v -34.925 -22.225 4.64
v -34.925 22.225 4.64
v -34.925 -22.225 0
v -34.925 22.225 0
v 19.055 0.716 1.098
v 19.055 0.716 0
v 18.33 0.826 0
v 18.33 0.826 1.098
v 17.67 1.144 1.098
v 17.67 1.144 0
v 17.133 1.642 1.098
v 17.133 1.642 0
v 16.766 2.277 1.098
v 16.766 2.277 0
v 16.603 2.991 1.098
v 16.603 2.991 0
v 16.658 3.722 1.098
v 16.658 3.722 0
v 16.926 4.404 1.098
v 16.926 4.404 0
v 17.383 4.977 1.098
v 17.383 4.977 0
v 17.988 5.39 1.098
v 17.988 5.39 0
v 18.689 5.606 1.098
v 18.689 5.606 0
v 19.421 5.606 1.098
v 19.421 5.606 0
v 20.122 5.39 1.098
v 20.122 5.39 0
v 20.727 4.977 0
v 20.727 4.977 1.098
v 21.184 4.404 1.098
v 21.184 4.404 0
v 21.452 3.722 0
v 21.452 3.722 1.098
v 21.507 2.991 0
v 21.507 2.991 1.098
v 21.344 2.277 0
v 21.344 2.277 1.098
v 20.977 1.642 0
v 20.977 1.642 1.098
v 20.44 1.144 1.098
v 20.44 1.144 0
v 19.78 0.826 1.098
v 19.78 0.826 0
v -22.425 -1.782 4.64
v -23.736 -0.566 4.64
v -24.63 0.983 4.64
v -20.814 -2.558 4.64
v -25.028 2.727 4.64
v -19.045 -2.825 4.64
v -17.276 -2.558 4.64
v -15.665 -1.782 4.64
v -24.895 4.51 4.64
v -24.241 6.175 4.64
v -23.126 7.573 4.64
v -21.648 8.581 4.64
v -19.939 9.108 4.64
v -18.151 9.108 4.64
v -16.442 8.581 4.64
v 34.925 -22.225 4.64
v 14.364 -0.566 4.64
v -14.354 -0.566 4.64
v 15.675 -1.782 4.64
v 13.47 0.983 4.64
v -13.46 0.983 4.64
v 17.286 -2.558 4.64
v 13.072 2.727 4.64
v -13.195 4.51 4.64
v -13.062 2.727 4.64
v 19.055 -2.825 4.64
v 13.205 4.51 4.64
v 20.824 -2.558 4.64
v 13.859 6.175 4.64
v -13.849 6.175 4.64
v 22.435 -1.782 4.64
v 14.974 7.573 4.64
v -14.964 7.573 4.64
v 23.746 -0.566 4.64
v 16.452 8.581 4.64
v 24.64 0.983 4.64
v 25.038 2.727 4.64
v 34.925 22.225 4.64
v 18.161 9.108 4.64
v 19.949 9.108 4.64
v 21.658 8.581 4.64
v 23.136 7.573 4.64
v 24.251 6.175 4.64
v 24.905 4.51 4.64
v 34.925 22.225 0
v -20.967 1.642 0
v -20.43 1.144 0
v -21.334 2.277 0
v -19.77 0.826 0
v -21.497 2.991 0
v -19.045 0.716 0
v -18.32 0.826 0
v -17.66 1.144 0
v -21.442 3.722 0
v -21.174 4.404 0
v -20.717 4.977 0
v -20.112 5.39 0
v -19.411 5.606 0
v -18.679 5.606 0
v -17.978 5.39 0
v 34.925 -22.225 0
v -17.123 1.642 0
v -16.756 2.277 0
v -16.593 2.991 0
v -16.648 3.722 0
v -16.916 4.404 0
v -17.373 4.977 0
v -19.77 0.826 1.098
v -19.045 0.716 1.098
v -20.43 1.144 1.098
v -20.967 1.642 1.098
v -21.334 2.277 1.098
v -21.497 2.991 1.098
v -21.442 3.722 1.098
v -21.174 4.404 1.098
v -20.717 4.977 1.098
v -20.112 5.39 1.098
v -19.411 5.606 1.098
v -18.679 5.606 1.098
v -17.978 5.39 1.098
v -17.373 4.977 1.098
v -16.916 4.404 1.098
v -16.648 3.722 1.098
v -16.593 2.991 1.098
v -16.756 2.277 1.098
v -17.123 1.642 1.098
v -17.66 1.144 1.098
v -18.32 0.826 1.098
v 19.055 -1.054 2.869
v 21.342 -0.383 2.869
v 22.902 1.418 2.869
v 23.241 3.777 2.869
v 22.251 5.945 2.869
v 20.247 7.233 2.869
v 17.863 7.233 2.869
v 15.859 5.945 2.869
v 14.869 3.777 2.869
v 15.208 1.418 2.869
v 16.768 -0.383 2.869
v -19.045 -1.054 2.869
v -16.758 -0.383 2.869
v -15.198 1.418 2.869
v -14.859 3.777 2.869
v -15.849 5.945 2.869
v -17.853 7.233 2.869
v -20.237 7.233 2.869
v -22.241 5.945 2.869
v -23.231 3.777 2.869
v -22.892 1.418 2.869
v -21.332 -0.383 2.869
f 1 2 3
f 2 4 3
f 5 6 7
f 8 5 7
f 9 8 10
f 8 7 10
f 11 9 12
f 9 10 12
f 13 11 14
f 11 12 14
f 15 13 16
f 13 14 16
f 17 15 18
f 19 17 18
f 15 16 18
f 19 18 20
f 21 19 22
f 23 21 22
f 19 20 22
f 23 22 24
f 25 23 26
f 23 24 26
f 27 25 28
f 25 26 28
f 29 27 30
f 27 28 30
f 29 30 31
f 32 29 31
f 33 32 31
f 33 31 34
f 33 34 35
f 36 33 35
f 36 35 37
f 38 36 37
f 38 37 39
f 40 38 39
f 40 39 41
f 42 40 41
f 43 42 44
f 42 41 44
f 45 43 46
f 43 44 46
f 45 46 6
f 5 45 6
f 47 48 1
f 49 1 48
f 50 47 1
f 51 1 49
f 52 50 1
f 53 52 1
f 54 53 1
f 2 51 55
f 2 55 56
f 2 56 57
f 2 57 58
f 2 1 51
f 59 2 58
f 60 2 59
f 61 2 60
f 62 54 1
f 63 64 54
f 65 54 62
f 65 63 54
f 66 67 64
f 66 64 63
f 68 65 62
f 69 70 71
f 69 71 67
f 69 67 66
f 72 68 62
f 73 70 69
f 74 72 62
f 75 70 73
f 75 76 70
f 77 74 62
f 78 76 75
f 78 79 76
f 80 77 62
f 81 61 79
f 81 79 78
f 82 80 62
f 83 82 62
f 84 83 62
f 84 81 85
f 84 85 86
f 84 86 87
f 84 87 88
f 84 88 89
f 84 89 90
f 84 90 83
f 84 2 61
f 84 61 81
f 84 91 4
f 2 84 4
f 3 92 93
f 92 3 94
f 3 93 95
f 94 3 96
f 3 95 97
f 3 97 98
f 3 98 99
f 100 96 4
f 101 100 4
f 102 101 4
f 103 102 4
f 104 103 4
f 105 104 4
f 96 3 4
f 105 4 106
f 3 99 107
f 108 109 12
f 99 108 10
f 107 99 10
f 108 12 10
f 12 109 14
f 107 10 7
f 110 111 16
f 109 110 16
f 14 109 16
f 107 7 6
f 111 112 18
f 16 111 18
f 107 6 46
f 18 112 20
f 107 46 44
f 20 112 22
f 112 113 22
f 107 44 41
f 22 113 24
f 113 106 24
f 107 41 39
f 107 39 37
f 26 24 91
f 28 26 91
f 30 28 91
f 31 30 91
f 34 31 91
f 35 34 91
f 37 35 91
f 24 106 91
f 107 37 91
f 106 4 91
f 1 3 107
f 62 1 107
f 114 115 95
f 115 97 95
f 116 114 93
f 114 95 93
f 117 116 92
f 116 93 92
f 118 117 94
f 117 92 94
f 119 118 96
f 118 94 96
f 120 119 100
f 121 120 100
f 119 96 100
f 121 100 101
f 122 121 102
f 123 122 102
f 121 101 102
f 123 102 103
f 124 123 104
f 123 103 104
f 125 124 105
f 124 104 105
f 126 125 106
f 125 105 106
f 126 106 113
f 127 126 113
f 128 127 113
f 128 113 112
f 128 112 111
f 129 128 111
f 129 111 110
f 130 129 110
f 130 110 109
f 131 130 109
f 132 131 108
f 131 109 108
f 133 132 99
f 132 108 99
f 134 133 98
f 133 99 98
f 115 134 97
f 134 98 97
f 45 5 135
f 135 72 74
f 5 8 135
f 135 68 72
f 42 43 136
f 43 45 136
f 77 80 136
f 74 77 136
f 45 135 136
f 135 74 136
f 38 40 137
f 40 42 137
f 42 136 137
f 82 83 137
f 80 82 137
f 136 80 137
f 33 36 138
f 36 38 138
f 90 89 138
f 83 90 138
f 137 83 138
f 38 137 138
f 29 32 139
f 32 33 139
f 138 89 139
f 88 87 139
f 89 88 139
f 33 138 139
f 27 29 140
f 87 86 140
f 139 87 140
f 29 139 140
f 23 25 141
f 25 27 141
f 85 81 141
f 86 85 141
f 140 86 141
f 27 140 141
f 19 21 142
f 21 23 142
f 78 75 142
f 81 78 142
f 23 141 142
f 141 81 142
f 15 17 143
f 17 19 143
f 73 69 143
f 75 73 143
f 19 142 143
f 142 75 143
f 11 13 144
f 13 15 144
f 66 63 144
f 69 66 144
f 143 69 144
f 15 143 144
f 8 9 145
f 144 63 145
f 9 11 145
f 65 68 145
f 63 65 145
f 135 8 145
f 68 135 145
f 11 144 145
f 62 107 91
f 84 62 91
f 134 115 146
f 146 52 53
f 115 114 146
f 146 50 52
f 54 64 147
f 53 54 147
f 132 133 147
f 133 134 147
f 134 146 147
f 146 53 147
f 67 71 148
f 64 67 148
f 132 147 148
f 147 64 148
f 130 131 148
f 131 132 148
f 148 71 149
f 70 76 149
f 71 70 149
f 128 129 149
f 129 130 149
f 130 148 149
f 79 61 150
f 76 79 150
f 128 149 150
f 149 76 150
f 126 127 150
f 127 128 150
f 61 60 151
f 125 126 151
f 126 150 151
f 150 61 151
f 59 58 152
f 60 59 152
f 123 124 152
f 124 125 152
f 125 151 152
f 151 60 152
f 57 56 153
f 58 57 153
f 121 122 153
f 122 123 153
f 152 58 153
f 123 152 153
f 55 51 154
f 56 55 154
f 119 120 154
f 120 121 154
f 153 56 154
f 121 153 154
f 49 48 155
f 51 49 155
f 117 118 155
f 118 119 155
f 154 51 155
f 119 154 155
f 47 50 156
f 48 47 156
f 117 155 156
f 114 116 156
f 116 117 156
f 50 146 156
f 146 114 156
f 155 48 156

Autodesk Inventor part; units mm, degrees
ref_plane "YZ Plane" through (0, 0, 0) normal (1, 0, 0) x (0, 1, 0)
ref_plane "XZ Plane" through (0, 0, 0) normal (0, 1, 0) x (-1, 0, 0)
ref_plane "XY Plane" through (0, 0, 0) normal (0, 0, 1) x (1, 0, 0)
sketch "Sketch1" plane through (0, 0, 0) normal (0, 0, 1) x (1, 0, 0)
  line L0 (-34.925, -22.225) -> (34.925, -22.225)
  line L1 (34.925, -22.225) -> (34.925, 22.225)
  line L2 (34.925, 22.225) -> (-34.925, 22.225)
  line L3 (-34.925, 22.225) -> (-34.925, -22.225)
  line L4 (-34.925, -22.225) -> (34.925, 22.225) construction
  line L5 (34.925, -22.225) -> (-34.925, 22.225) construction
  point P0 (0, 0)
  dimension "d0" = 69.85
  dimension "d1" = 44.45
extrude "Extrusion1" add sketch "Sketch1" along normal blind 4.64
sketch "Sketch2" plane through (0, 0, 4.64) normal (0, 0, 1) x (1, 0, 0)
  line L0 (-34.925, -22.225) -> (34.925, -22.225) projected
  line L1 (-34.925, 22.225) -> (-34.925, -22.225) projected
  point P0 (0, 0)
  point P1 (-19.045, 3.175)
  point P2 (19.055, 3.175)
  dimension "d4" = 25.4
  dimension "d5" = 15.88
  dimension "d6" = 38.1
hole "Hole1" at (-19.045, 3.175, 4.64) at (19.055, 3.175, 4.64) direction (0, 0, -1) diameter 4.917 depth 15 tip angle 118 countersink diameter 12 countersink angle 90 thread size "M6x1" class "6H" standard "ANSI Metric M Profile"
properties part number "plaka"
